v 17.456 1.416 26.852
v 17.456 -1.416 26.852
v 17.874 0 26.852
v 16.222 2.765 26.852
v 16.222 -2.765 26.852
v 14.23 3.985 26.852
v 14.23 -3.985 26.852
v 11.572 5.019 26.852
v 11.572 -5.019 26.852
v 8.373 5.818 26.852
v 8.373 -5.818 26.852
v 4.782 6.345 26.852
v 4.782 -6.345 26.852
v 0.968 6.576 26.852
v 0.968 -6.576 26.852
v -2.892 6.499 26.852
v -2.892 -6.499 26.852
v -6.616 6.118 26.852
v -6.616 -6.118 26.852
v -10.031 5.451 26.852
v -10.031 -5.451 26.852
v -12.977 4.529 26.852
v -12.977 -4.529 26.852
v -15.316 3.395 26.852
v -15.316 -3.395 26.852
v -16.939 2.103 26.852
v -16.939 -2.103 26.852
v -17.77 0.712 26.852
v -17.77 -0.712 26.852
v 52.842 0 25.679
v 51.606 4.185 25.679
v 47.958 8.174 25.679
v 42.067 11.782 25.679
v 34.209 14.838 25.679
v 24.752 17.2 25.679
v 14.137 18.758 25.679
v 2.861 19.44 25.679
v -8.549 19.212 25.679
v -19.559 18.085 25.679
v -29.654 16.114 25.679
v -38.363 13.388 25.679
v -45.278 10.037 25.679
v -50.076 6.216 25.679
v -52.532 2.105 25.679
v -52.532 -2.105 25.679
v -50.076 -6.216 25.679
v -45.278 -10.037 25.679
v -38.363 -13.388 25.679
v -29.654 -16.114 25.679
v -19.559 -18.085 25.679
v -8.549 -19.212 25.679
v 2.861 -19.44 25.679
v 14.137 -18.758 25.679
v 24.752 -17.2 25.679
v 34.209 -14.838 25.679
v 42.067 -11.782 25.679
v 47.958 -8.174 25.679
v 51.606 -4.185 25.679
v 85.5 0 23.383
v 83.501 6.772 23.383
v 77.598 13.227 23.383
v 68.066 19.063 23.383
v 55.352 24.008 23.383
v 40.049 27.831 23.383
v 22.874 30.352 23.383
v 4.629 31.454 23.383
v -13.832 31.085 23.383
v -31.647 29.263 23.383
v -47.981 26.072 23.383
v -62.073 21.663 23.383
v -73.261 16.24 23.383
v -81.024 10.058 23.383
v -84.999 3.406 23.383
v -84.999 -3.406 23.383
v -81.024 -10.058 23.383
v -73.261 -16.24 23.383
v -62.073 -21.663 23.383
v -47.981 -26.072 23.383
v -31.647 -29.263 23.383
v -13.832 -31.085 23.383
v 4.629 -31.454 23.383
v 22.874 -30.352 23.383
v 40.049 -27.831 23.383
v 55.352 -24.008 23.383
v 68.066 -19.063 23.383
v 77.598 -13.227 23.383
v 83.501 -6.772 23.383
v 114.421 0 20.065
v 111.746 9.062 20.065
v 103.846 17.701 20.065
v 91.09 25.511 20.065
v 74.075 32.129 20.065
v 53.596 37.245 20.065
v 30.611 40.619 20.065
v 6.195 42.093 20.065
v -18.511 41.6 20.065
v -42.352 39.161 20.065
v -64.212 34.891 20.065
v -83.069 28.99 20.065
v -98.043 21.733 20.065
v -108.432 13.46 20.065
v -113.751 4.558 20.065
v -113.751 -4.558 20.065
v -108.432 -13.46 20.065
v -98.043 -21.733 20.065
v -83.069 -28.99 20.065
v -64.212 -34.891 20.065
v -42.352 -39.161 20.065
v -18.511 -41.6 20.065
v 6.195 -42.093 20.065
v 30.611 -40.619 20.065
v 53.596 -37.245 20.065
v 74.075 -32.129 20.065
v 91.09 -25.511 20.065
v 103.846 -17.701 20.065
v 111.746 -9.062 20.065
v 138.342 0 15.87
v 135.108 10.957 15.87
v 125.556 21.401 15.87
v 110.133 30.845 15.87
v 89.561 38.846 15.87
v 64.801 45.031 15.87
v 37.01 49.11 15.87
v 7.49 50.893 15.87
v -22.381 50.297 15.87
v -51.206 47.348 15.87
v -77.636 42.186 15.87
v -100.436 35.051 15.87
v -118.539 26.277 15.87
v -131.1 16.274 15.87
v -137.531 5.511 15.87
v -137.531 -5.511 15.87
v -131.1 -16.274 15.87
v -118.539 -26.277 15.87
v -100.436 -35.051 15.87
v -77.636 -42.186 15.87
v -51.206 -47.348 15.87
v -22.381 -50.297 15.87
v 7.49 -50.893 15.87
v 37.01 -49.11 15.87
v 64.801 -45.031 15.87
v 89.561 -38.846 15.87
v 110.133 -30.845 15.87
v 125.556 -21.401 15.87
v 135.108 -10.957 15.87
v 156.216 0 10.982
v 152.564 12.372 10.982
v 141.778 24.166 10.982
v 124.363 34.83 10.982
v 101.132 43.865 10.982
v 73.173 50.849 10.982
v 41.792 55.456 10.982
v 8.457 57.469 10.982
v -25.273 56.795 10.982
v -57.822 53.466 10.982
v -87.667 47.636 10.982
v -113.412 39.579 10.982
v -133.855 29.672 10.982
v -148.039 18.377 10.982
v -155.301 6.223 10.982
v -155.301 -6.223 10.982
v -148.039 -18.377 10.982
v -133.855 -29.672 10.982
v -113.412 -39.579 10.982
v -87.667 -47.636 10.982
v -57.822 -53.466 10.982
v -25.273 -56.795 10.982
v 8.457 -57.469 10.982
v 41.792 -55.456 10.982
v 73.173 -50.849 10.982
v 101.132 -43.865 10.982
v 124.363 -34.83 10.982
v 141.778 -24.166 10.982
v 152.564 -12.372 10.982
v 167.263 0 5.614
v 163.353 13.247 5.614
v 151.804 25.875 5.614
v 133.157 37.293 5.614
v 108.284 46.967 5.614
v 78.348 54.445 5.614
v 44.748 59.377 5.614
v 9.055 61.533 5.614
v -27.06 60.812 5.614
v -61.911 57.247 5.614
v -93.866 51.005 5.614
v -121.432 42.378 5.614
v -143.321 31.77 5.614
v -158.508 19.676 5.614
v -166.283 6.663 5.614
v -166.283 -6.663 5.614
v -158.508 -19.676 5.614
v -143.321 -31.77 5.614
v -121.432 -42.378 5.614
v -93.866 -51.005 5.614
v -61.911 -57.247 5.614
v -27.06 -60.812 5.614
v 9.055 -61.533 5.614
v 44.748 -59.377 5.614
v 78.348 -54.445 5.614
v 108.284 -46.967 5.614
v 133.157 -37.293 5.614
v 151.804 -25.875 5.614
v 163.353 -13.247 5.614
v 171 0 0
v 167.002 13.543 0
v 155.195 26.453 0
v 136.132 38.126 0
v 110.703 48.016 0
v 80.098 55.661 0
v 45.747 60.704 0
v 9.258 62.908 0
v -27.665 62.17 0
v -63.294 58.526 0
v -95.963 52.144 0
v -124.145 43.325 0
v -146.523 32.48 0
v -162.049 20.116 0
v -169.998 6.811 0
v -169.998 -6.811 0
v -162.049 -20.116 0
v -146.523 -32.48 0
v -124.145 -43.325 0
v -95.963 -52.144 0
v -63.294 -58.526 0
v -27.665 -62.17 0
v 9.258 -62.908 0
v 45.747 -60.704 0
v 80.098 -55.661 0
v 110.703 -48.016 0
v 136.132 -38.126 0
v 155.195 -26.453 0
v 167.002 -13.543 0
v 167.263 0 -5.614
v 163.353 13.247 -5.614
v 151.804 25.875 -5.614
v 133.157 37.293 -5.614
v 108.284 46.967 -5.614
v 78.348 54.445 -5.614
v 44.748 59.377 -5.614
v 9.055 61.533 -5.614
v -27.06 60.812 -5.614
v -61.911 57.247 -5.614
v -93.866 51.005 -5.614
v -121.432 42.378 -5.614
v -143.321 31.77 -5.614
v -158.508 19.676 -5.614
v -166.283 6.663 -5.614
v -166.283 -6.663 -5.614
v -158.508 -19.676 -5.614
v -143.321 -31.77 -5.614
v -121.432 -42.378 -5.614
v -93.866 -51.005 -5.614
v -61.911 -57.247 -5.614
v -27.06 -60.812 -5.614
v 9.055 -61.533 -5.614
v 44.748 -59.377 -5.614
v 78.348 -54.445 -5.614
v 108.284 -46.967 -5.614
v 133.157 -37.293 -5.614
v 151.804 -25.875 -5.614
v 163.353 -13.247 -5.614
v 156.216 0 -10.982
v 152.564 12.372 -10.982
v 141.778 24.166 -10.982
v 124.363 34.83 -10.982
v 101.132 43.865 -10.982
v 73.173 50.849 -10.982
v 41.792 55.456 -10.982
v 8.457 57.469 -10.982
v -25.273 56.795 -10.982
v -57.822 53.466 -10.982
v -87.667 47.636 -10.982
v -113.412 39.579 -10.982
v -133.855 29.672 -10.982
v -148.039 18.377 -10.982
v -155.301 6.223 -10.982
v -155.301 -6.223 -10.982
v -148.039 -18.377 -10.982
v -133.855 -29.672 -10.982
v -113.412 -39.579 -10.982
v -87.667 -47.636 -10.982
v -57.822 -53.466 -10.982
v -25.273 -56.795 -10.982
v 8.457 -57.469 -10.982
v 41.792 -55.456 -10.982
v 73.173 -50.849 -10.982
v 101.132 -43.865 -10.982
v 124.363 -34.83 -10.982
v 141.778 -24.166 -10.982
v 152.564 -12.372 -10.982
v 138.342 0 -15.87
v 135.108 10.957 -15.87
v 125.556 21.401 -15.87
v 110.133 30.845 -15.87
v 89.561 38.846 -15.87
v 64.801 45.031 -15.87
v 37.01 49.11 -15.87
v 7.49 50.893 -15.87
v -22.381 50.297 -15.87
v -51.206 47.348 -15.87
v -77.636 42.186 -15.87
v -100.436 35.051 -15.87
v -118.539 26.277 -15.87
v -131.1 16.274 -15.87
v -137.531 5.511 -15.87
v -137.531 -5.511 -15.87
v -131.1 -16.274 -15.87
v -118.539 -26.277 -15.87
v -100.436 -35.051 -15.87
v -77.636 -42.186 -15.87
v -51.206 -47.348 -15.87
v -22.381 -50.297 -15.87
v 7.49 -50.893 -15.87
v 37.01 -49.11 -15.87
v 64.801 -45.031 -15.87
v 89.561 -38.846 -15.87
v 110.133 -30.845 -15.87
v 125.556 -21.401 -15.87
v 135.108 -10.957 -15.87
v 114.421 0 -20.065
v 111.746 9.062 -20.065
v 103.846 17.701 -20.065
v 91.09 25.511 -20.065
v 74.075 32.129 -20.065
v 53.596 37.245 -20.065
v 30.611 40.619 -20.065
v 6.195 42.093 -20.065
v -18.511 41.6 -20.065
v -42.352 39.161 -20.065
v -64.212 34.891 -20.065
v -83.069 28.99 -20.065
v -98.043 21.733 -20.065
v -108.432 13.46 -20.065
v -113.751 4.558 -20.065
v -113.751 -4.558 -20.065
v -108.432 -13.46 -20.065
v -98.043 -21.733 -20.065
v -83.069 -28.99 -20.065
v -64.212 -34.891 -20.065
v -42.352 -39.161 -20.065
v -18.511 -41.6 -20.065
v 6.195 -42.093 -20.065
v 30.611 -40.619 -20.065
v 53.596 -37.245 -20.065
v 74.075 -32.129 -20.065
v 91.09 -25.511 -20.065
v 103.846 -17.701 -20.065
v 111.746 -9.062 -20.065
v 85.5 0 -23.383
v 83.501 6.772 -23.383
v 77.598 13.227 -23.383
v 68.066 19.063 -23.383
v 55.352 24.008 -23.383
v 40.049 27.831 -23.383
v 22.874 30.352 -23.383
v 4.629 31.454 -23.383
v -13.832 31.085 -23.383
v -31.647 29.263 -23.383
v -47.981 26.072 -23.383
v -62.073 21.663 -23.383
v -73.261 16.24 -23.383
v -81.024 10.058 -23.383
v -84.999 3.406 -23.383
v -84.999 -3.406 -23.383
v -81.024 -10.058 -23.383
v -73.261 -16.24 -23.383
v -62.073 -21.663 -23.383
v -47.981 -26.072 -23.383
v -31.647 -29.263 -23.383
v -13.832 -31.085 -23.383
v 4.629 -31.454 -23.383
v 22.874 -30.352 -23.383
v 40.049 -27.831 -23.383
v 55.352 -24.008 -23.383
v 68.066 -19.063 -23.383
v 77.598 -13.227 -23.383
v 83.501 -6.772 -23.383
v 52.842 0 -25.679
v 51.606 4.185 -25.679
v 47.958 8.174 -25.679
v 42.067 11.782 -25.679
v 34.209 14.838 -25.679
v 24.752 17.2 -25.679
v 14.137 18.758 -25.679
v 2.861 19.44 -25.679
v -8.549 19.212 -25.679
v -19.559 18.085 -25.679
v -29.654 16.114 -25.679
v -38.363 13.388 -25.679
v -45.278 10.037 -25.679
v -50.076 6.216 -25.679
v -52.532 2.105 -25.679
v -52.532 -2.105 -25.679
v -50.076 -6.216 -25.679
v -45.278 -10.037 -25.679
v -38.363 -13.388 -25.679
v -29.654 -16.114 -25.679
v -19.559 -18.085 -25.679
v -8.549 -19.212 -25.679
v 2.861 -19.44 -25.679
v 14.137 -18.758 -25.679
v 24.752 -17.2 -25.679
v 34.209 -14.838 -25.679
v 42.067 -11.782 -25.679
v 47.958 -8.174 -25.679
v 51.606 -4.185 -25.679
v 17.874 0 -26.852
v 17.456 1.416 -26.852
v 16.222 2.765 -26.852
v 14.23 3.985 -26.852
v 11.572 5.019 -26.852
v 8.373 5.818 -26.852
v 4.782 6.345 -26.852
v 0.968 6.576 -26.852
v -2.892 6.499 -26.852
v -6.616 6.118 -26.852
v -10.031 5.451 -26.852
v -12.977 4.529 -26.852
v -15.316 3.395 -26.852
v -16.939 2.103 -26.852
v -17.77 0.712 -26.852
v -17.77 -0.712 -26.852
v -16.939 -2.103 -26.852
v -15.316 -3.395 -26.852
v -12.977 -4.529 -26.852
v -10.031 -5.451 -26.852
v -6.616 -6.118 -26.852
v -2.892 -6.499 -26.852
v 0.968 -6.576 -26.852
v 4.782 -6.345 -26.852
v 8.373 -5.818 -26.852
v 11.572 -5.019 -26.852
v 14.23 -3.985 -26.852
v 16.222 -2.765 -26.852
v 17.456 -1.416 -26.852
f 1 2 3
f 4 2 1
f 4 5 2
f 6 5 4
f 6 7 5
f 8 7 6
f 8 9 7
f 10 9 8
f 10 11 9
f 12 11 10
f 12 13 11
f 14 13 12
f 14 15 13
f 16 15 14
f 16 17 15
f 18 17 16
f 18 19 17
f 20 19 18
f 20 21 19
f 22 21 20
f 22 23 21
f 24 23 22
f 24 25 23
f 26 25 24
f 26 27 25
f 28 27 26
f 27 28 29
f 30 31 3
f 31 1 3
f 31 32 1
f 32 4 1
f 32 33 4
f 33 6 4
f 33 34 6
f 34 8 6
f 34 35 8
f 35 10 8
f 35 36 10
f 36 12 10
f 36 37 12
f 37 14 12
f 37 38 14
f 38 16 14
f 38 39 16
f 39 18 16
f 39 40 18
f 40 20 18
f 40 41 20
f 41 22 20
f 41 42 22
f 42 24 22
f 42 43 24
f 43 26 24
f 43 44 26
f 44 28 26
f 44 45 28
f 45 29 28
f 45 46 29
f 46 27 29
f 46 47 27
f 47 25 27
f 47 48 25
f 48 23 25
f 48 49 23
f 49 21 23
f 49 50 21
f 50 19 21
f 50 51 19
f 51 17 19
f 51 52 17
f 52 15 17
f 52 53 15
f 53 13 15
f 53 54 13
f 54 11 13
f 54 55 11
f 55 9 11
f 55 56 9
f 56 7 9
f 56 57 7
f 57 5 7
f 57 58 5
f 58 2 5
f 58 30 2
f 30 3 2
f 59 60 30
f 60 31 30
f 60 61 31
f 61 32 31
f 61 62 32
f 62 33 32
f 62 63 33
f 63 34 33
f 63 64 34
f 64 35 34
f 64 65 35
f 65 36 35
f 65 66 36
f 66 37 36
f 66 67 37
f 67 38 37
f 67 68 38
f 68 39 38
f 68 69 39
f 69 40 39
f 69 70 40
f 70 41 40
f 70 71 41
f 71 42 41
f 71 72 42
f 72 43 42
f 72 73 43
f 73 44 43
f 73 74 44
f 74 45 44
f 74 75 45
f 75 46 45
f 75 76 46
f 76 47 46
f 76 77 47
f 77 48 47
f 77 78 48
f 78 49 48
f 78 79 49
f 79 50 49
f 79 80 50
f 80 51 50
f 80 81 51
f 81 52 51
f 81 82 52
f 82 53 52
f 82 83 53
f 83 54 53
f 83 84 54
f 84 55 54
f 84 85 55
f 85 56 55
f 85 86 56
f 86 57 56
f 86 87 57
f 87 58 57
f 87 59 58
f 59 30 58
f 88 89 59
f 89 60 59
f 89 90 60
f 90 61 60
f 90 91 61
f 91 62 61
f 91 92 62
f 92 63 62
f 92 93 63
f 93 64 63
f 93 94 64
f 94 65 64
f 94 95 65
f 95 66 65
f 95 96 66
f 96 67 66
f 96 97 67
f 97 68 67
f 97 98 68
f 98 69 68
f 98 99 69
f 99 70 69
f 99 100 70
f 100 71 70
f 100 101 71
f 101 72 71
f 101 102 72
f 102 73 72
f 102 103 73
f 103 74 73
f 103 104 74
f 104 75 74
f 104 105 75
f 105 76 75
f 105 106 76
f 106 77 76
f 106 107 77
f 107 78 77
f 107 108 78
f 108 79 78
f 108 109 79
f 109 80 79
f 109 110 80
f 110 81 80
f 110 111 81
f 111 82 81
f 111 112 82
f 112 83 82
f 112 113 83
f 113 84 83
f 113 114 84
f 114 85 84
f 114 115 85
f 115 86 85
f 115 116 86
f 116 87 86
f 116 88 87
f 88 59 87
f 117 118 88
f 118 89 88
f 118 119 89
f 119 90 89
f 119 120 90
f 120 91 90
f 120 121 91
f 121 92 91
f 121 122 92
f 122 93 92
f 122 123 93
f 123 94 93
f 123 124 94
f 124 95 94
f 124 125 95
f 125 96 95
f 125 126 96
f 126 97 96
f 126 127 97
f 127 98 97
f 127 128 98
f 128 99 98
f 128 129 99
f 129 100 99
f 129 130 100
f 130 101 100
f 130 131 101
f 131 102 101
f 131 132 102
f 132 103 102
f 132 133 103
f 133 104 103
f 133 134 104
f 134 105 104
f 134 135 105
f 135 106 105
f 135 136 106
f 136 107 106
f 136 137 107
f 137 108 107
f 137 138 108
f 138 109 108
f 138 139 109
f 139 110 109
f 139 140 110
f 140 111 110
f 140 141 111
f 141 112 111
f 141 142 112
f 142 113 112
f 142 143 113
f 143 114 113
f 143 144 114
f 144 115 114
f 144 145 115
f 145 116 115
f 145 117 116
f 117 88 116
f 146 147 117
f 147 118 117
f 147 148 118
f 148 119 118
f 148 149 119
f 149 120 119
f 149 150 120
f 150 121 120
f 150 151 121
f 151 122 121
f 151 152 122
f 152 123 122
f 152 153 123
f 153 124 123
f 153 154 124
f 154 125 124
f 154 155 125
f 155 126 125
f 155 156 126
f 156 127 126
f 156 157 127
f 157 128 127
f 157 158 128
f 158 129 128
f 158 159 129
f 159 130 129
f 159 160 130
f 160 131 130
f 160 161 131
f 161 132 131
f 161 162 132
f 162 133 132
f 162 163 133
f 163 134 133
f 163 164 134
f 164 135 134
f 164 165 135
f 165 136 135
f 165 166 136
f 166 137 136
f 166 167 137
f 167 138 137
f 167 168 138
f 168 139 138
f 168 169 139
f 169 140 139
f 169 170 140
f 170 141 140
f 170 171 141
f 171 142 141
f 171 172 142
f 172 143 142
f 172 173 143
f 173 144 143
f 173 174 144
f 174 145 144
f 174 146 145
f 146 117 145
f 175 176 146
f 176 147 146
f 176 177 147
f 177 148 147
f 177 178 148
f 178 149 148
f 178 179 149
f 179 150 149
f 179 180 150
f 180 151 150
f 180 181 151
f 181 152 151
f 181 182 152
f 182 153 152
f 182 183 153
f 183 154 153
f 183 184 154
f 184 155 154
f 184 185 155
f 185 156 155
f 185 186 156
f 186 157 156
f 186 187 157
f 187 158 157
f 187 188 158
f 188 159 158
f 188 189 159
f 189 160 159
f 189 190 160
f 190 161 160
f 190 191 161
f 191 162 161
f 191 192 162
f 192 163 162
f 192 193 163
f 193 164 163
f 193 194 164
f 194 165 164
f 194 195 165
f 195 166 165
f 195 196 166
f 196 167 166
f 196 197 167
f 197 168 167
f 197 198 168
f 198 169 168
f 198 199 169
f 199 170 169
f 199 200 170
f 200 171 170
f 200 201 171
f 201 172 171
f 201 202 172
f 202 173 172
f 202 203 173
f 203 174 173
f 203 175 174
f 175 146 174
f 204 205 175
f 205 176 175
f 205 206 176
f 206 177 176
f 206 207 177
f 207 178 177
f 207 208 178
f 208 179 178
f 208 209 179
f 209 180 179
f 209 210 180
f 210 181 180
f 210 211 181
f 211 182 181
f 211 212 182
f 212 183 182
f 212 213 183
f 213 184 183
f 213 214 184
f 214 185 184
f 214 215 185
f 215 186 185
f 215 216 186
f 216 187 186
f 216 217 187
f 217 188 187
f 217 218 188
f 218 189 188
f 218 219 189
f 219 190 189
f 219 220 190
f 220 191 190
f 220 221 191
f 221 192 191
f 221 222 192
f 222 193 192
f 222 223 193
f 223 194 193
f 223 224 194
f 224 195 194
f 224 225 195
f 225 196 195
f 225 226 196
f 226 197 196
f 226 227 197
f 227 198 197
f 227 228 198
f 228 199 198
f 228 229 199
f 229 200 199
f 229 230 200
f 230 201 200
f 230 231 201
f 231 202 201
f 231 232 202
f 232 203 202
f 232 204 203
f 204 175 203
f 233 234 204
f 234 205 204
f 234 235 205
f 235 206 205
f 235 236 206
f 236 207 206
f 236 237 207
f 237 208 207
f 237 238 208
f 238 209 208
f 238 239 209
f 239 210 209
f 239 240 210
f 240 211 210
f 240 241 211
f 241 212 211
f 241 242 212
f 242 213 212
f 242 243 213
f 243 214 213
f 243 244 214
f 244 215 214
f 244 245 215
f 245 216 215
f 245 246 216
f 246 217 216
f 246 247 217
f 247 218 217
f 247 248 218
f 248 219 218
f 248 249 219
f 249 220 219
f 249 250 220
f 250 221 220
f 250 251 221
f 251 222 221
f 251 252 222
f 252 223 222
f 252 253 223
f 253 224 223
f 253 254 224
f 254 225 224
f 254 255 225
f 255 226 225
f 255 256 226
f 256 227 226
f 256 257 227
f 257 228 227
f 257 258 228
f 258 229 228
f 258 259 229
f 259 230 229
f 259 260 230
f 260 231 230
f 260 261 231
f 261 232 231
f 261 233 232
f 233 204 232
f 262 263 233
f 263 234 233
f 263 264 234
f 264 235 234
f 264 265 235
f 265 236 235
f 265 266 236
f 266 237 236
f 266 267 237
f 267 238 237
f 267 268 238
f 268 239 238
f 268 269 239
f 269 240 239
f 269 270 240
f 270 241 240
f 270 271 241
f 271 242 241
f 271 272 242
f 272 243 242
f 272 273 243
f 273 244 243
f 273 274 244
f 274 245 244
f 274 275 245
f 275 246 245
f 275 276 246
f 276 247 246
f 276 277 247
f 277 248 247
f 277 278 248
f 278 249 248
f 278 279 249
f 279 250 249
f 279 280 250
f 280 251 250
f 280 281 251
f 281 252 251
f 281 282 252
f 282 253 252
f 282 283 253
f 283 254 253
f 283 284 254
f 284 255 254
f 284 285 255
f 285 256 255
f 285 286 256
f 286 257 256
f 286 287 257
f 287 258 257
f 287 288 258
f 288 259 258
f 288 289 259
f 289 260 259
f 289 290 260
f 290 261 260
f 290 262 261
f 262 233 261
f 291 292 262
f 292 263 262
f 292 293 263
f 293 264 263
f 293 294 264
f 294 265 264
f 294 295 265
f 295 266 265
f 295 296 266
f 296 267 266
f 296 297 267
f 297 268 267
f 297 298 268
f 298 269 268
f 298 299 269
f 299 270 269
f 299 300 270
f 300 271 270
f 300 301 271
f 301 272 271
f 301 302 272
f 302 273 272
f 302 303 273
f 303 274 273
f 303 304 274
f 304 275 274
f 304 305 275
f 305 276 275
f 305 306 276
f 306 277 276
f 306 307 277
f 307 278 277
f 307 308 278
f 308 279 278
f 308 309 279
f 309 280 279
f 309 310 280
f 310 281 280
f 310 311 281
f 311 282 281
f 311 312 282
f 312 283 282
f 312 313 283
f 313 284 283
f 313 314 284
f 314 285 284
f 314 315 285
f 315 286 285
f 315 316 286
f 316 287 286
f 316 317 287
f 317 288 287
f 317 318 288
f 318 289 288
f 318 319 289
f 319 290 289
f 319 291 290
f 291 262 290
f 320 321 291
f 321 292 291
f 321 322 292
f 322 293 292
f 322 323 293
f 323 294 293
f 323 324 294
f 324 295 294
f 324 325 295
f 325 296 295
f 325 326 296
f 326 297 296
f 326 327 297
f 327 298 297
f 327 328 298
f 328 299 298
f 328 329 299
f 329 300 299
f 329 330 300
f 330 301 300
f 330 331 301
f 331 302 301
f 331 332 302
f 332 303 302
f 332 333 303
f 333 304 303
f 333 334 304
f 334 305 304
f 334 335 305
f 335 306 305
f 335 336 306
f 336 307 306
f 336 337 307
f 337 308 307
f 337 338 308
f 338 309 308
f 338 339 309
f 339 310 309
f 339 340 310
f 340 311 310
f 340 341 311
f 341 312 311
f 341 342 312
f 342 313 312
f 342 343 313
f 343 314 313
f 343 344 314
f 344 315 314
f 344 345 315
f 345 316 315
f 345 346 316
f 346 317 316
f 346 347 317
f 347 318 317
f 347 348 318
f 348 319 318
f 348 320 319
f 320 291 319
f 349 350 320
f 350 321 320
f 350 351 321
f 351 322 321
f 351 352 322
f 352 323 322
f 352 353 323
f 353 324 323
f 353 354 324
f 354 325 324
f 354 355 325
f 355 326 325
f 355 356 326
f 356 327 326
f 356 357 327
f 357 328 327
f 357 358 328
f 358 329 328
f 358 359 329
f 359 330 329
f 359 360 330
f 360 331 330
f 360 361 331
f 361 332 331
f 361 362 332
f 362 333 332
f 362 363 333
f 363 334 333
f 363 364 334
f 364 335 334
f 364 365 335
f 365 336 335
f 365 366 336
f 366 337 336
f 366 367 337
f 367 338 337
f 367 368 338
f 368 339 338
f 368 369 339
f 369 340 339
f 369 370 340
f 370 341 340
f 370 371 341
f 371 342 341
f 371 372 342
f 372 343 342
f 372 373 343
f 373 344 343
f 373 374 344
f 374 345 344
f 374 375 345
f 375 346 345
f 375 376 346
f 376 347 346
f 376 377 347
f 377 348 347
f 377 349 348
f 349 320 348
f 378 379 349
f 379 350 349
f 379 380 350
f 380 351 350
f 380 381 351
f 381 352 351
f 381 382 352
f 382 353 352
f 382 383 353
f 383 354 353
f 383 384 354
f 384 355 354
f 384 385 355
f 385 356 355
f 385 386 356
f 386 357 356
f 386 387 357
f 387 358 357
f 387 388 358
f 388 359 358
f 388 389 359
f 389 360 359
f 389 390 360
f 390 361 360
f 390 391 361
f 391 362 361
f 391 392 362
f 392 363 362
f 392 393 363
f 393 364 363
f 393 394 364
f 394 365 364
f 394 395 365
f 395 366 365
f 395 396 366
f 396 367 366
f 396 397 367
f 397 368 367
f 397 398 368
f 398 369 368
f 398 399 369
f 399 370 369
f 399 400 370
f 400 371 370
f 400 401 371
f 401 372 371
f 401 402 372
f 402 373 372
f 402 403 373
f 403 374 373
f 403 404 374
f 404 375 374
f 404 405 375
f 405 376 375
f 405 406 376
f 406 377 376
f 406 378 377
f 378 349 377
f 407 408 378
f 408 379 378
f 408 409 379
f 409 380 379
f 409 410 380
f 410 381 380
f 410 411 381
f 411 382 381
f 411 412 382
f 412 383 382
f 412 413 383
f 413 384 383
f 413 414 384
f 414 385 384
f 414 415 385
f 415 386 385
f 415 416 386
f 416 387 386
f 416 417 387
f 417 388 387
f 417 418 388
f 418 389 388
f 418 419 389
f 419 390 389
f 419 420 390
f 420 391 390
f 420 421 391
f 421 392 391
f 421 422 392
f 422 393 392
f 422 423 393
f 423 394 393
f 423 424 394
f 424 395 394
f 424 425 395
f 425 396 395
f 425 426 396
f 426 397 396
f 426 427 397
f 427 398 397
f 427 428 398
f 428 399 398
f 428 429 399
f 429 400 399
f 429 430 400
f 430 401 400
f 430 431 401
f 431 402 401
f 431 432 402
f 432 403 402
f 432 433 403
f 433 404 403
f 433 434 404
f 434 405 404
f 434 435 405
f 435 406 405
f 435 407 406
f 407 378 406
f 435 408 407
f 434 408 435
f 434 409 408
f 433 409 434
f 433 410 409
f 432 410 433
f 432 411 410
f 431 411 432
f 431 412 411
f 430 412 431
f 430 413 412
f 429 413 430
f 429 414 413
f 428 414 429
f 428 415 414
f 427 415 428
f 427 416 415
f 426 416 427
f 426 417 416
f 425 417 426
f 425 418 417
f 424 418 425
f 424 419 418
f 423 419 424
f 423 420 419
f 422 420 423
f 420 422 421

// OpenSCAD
// Generated by SolidPython 1.0.1 on 2020-07-29 00:46:53


scale(v = [19, 7, 3]) {
	sphere(r = 9);
}
/***********************************************
*********      SolidPython code:      **********
************************************************
 
# import packages: SolidPython
from solid import *
from solid.utils import *
from itertools import chain, combinations, permutations


class Resize:

    def __init__(self, scad_file):
        self.scad_file = scad_file
        #self.scad_file = import_scad(scad_file)
        # cone/cylinder param:
        self.r1 = 0
        self.r2 = 0
        self.h = 0
        # rectangular prism param:
        self.w = 0
        self.l = 0
        # ellipse param:
        self.r = 0

    # import OpenScad code (file name corresponds to shape)


    # classify shape + parameters
    def assign(self, param1, param2, param3):
        if self.scad_file == 'cone.scad':
            self.r1 = param1
            self.r2 = param2
            self.h = param3
        elif self.scad_file == 'cylinder.scad':
            self.r1 = param1
            self.r2 = param2
            self.h = param3
        elif self.scad_file == 'rectangularPrism.scad':
            self.h = param1
            self.l = param2
            self.w = param3
        else:
            self.r = param1
            self.h = param2

    # resize parameters
    def iterate(self):
        x = range(3, 20, 2)
        i = 1
        if self.scad_file == 'cone.scad':
            tempList = list(permutations(x, 2))
            for temp in tempList:
                param1 = temp[0]
                param2 = temp[1]
                filepath = 'produced_scad_files/' + 'cone' + str(param1) + '_' + str(param2) + '_' + '.scad'
                scad_render_to_file(cylinder(h=param1, r1=param2, r2=0), filepath)

        elif self.scad_file == 'cylinder.scad':
            tempList = list(permutations(x, 3))
            for temp in tempList:
                param1 = temp[0]
                param2 = temp[1]
                filepath = 'produced_scad_files/' + 'cylinder' + str(param1) + '_' + str(param2) + '_' + '.scad'
                scad_render_to_file(cylinder(h=param1, r1=param2, r2=param2), filepath)

        elif self.scad_file == 'rectangularPrism.scad':
            tempList = list(permutations(x, 3))
            for temp in tempList:
                param1 = temp[0]
                param2 = temp[1]
                param3 = temp[2]
                filepath = 'produced_scad_files/' + 'rectangularPrism' + str(param1) + '_' + str(param2) + '_' + str(
                    param3) + '.scad'
                scad_render_to_file(cube(size=(param1, param2, param3)), filepath)

        elif self.scad_file == 'ellipse.scad':
            tempList = list(permutations(x, 4))
            for temp in tempList:
                param1 = temp[0]
                param2 = temp[1]
                param3 = temp[2]
                param4 = temp[3]
                filepath = 'produced_scad_files/' + 'ellipse' + str(param1) + '_' + str(param2) + '_' + str(param3) + '_' + str(param4) + '.scad'
                scad_render_to_file(scale([param1, param2, param3])(sphere(r=param4)), filepath)

    def render_to_scadfile(self):
        scad_render_to_file(scad, 'example.scad') 
 
************************************************/
